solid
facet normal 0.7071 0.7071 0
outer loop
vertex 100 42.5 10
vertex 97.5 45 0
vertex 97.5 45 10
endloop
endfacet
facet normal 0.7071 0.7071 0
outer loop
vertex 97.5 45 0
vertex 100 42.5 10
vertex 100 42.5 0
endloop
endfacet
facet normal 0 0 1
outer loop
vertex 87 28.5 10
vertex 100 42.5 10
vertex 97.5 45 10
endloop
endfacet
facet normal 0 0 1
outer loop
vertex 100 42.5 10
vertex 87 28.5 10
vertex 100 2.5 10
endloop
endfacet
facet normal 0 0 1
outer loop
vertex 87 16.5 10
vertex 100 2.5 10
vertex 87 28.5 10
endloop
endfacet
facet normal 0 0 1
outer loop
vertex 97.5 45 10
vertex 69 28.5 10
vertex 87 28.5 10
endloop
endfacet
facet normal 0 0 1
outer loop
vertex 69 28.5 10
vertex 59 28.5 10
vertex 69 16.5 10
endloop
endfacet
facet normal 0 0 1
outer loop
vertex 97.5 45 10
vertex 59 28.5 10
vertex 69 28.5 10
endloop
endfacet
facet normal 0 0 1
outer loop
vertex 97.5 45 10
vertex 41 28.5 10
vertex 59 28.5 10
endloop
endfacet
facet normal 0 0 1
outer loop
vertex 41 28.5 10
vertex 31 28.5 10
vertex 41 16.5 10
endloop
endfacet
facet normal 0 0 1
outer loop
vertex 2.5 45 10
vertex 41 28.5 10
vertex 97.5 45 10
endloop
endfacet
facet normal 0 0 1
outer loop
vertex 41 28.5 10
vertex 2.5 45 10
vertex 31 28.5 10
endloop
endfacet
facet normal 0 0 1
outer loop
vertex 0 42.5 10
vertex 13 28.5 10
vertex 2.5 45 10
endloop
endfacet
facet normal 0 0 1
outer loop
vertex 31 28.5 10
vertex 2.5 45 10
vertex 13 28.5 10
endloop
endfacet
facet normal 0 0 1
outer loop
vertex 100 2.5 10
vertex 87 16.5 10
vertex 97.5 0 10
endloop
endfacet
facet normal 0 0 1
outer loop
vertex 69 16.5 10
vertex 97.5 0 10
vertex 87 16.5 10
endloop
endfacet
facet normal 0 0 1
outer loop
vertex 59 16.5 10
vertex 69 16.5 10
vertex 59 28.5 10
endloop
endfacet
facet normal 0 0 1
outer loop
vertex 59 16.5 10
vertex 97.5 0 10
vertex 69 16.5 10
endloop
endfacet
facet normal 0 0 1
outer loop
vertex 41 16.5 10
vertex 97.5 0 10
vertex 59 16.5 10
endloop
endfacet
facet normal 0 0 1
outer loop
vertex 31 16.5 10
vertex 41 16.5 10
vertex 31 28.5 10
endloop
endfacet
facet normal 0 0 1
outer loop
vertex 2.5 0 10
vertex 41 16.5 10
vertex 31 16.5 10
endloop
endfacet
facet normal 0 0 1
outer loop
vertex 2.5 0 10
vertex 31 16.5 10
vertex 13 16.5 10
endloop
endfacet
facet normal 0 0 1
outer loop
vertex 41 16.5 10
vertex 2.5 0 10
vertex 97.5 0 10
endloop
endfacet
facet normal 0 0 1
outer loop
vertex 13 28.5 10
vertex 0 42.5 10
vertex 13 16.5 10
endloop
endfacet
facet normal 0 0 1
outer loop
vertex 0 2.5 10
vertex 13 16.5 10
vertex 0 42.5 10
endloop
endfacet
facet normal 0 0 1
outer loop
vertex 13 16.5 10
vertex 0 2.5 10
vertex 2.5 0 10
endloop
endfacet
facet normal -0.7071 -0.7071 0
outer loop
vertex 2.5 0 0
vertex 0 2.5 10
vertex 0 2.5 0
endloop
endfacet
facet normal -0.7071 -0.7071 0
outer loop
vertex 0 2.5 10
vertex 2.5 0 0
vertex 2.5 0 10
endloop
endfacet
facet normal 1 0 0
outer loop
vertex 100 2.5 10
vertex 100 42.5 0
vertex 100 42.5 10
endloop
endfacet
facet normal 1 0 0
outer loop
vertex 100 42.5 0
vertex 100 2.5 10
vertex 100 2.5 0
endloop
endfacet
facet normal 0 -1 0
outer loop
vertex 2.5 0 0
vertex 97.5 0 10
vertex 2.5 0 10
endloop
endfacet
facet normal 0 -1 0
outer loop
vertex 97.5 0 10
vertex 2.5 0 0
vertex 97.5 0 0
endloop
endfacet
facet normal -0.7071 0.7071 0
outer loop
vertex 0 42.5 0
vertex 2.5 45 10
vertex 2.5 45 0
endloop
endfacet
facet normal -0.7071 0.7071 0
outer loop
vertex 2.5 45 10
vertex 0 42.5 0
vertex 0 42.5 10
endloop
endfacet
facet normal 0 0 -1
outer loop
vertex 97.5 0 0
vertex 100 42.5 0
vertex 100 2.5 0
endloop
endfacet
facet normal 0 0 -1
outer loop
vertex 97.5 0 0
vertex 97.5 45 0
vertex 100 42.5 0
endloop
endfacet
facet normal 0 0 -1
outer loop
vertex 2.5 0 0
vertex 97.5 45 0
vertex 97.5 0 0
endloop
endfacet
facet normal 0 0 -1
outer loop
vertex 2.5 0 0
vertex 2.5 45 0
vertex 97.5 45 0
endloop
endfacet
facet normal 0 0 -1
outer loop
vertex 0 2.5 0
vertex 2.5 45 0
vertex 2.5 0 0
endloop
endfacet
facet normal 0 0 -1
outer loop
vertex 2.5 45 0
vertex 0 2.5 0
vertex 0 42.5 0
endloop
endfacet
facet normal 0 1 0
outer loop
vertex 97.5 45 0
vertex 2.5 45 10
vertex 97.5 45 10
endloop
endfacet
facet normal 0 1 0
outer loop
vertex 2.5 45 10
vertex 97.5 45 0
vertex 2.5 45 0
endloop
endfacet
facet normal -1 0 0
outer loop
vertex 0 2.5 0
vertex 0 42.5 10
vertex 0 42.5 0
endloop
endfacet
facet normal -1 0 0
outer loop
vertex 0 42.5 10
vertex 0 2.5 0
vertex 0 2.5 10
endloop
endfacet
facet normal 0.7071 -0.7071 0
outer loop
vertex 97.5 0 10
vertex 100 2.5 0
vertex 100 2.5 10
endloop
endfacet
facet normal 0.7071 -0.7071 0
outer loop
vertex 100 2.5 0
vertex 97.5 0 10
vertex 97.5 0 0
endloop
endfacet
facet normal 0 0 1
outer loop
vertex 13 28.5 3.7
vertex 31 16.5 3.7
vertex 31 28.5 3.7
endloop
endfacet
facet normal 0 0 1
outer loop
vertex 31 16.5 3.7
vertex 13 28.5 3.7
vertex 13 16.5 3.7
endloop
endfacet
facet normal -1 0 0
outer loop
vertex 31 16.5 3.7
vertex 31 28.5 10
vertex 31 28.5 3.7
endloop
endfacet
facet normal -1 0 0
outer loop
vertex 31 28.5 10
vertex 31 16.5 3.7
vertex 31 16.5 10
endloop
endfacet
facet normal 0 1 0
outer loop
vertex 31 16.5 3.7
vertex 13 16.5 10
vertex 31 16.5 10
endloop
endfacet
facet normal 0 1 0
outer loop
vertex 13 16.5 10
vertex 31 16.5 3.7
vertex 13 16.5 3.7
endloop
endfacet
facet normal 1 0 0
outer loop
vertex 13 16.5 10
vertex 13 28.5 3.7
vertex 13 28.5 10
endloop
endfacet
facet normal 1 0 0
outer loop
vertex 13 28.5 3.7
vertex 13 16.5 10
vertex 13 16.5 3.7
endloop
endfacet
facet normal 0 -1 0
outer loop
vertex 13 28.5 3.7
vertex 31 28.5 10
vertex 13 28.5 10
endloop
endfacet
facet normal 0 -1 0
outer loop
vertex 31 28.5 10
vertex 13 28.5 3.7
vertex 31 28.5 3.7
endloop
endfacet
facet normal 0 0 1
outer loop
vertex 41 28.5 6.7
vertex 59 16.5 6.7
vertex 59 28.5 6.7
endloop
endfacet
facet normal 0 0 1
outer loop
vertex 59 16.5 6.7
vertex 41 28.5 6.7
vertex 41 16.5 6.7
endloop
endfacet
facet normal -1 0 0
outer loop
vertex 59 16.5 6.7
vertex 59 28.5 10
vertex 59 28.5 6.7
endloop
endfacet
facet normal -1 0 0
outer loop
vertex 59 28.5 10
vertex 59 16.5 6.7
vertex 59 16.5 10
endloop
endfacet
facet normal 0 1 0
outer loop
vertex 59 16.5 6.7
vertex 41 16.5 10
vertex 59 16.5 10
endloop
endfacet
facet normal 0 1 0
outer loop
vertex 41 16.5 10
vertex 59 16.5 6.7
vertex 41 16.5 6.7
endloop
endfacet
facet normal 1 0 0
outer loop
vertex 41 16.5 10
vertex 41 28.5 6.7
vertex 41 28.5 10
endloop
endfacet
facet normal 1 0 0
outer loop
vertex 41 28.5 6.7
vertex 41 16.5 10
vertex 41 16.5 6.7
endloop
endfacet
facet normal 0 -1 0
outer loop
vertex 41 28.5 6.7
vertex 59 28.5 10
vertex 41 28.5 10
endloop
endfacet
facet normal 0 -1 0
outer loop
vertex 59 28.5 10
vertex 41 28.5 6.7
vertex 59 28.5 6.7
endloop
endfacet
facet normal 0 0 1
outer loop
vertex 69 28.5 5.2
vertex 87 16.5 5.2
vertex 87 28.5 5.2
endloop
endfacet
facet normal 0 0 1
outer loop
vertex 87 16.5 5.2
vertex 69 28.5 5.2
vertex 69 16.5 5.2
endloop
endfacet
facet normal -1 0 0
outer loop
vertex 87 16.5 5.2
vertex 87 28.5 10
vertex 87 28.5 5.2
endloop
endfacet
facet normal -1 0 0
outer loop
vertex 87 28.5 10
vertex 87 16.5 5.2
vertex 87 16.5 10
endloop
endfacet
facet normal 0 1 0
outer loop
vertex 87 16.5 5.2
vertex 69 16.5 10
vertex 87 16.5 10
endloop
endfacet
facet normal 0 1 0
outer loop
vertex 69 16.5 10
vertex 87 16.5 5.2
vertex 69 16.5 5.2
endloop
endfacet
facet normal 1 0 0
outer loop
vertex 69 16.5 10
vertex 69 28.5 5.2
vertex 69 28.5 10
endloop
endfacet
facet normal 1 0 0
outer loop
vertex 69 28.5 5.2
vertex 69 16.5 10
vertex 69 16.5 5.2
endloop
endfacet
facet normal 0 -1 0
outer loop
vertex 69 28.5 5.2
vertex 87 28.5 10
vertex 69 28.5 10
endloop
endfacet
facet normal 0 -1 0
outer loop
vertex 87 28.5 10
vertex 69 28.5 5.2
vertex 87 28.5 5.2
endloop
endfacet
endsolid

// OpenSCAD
$fn = 32;

// ----------------------------------------------------------------------
// Windowed plate: 3 voids, 100 x 45 x 10 mm
// ----------------------------------------------------------------------

// --- parameters (mm) ---
plate_l = 100;            // plate length, X
plate_w = 45;             // plate width, Y
plate_t = 10;             // plate thickness, Z
edge_margin = 8;          // wall from the plate edge to any window
windows = 3;              // number of windows in the row
win_l = 18;               // window length
win_w = 12;               // window width
win_pitch = 28;           // window pitch along X
depth_1 = 6.3;            // depth of void 1 (full thickness = through)
depth_2 = 3.3;            // depth of void 2 (full thickness = through)
depth_3 = 4.8;            // depth of void 3 (full thickness = through)
corner_c = 2.5;           // corner chamfer of the plate

profile = [[2.5, 0], [97.5, 0], [100, 2.5], [100, 42.5], [97.5, 45], [2.5, 45], [0, 42.5], [0, 2.5]];  // primary outline, 8 points, counter clockwise
void_1 = [[13, 16.5], [31, 16.5], [31, 28.5], [13, 28.5]];  // window 1 of the row, 4 points
void_2 = [[41, 16.5], [59, 16.5], [59, 28.5], [41, 28.5]];  // window 2 of the row, 4 points
void_3 = [[69, 16.5], [87, 16.5], [87, 28.5], [69, 28.5]];  // window 3 of the row, 4 points

// --- the one profile operation ---
difference() {
  linear_extrude(height = plate_t) polygon(points = profile);
  translate([0, 0, plate_t - depth_1])
    linear_extrude(height = depth_1 + 1) polygon(points = void_1);
  translate([0, 0, plate_t - depth_2])
    linear_extrude(height = depth_2 + 1) polygon(points = void_2);
  translate([0, 0, plate_t - depth_3])
    linear_extrude(height = depth_3 + 1) polygon(points = void_3);
}
